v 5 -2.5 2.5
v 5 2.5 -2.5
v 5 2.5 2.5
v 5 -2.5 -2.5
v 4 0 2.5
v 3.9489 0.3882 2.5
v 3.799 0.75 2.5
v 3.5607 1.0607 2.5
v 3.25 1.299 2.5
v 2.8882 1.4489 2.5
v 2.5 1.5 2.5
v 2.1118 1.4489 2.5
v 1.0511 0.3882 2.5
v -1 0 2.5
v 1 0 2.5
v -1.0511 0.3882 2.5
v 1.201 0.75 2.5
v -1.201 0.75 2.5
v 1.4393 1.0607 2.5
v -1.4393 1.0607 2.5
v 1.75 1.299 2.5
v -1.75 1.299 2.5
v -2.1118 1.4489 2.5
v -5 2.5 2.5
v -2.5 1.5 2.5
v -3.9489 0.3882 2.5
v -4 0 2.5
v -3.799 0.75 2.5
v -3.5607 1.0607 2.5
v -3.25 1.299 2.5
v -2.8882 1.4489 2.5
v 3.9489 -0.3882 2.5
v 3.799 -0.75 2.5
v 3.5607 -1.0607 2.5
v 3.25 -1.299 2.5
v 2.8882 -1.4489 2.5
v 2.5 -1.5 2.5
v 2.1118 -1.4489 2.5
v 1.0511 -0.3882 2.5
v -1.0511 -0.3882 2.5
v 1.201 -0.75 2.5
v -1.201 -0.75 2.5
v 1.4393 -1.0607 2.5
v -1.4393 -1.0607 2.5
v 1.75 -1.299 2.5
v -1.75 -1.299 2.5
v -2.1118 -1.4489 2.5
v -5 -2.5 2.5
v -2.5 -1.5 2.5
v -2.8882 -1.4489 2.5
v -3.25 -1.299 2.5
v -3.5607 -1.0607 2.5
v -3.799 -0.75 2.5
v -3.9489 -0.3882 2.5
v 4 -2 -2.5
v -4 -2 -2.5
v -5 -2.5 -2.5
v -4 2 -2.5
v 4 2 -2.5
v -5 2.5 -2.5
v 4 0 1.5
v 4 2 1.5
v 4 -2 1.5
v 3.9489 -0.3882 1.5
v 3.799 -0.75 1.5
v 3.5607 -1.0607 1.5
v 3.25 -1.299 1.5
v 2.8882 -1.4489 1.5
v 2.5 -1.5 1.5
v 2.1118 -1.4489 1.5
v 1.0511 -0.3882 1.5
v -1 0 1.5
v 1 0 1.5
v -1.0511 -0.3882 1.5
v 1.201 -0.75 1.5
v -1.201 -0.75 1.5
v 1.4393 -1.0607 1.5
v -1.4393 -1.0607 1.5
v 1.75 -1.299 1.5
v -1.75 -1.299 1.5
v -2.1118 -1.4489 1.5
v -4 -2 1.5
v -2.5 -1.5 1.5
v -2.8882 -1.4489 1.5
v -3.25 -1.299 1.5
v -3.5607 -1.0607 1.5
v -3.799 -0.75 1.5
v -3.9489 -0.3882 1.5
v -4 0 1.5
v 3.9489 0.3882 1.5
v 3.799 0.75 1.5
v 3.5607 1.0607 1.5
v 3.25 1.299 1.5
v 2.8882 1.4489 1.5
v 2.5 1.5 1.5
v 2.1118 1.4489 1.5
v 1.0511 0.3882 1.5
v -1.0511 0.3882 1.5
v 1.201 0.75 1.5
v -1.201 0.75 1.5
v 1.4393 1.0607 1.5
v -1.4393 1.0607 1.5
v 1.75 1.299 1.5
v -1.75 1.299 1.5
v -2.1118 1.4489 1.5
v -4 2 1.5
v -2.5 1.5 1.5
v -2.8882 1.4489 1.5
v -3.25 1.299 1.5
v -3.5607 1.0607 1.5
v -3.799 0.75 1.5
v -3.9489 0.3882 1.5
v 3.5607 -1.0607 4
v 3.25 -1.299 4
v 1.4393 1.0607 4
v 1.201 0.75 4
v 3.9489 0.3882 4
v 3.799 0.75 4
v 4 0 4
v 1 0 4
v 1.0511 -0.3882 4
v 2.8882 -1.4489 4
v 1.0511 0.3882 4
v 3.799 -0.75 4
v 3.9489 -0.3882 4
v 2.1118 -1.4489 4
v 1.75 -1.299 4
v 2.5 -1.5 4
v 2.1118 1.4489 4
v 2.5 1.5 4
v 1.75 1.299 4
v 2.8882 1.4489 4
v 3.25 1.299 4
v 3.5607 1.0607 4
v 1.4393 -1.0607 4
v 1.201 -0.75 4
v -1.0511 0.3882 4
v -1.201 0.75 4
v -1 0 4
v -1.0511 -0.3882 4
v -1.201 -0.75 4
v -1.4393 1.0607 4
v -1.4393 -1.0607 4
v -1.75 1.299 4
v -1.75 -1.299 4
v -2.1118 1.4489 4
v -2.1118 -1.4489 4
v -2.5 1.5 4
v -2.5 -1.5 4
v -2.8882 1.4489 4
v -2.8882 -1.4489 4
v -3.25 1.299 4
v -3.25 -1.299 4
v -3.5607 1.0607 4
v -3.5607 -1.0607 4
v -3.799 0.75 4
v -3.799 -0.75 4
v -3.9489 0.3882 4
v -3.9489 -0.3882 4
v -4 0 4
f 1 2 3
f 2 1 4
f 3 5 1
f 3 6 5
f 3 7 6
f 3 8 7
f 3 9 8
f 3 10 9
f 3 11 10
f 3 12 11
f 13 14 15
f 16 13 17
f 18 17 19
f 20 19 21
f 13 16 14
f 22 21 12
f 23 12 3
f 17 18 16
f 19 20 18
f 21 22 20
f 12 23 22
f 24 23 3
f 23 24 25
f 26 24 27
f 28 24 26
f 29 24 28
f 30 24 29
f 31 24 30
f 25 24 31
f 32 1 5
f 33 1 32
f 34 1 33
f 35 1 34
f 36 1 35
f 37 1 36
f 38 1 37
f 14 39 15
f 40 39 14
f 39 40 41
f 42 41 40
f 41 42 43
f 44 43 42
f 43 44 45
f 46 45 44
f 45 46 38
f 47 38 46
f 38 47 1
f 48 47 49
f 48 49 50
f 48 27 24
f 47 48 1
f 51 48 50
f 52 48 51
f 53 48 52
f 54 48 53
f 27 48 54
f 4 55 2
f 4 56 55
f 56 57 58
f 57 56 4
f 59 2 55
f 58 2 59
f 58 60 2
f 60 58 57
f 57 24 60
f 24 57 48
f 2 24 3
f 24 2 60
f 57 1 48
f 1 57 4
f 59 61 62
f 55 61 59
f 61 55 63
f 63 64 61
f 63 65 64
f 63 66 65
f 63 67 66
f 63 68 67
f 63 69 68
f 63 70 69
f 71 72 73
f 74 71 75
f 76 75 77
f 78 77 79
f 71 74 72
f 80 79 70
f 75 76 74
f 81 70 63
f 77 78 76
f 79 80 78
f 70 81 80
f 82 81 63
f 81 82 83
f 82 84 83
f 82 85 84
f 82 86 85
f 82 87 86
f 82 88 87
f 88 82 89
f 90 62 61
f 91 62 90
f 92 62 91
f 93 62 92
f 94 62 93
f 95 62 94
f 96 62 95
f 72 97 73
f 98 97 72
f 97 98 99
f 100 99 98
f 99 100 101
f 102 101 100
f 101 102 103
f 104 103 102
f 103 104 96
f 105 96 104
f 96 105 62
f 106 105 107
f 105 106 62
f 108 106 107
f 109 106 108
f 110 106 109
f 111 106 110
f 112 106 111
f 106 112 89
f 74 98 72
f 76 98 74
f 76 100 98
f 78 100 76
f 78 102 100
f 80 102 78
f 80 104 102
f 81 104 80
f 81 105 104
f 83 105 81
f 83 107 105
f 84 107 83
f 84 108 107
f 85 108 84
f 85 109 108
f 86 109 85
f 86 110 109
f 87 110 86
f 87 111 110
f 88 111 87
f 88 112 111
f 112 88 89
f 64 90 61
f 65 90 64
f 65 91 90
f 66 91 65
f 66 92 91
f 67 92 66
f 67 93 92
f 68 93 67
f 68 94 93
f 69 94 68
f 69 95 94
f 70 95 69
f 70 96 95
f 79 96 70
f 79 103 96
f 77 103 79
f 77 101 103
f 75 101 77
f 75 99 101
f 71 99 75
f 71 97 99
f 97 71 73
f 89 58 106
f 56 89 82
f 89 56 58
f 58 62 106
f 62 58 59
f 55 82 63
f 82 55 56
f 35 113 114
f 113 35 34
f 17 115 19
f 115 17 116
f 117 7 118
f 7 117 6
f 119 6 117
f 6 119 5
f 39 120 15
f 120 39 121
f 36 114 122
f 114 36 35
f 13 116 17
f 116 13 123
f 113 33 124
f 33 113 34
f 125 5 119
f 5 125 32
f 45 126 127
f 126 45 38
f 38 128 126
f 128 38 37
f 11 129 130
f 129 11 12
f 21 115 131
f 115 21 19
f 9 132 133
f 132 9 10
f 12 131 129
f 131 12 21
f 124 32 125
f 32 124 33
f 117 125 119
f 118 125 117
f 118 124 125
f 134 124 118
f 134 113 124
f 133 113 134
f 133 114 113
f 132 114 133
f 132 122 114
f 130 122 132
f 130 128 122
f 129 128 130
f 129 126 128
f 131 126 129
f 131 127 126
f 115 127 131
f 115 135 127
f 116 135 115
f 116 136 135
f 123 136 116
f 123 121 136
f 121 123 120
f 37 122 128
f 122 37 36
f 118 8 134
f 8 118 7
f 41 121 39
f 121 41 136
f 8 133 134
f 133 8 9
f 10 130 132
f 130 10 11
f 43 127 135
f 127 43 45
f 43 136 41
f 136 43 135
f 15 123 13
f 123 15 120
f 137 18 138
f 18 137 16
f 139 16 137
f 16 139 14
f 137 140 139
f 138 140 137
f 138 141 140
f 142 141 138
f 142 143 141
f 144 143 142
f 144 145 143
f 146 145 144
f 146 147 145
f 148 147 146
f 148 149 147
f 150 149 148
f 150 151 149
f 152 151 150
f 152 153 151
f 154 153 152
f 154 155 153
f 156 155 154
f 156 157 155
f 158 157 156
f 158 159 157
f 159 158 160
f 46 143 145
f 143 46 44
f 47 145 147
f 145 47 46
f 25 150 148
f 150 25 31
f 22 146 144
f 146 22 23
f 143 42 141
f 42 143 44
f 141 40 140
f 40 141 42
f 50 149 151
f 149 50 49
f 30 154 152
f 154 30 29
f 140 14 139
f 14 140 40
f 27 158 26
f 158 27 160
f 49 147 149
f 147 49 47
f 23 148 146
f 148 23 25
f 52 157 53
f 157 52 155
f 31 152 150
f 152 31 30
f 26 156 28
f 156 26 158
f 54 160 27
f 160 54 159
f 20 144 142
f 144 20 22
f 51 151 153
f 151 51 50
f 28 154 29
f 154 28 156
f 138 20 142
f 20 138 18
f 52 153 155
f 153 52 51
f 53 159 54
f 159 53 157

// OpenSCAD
$fa = 1;
$fs = 0.4;
difference() {
    cube([10,5,5],center=true);
    translate([0,0,-0.5])
        cube([8,4,4],center=true);
    };
translate([2.5,0,1.5])
    cylinder(2.5,1.5,1.5);
translate([-2.5,0,1.5])
    cylinder(2.5,1.5,1.5);
